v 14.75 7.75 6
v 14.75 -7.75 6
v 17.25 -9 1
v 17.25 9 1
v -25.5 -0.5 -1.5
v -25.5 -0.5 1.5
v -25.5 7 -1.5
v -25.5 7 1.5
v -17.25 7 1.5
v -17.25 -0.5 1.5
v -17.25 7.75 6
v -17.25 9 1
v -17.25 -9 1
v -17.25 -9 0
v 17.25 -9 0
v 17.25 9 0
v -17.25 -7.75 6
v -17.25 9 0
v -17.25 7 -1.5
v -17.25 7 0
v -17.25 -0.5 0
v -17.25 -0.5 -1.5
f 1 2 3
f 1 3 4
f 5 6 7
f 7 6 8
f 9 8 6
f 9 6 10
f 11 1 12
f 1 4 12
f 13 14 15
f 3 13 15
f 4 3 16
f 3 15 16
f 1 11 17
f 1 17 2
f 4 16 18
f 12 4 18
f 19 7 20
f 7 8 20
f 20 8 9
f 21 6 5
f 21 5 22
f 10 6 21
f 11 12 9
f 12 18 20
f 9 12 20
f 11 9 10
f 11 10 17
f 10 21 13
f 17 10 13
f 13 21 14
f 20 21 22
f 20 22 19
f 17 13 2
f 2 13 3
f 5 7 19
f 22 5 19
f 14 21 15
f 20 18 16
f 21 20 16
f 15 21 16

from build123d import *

# Parameters (mm, degrees)
F1_DEPTH = 6
F0_W     = 8.25
F0_H     = 7.5
F2_DEPTH = 1.5
F3_SIZE2 = 5
F3_SIZE  = 1.25
F4_SIZE2 = 2.5
F4_SIZE  = 5


with BuildPart() as f1:
    # F0 (on Top) → F1 (new body)
    with BuildSketch(Plane.XY):
        Polygon((17.25, 9), (-17.25, 9), (-17.25, 7), (-17.25, -0.5), (-17.25, -9), (17.25, -9), align=None)
    extrude(amount=F1_DEPTH)

    # F0 (on Top) → F2 (join, symmetric)
    with BuildSketch(Plane.XY):
        with Locations((-21.375, 3.25)):
            Rectangle(F0_W, F0_H)
    extrude(amount=F2_DEPTH, both=True)

    # F3
    f3_edges = [f1.edges().sort_by_distance(p)[0] for p in [
        (0, -9, 6),
        (0, 9, 6),
    ]]
    f3_side = f1.faces().sort_by_distance((0, 0, 6))[0]
    chamfer(f3_edges, length=F3_SIZE, length2=F3_SIZE2, reference=f3_side)

    # F4
    f4_edges = [f1.edges().sort_by_distance(p)[0] for p in [
        (17.25, 0, 6),
    ]]
    f4_side = f1.faces().sort_by_distance((17.25, 0, 2.9181))[0]
    chamfer(f4_edges, length=F4_SIZE, length2=F4_SIZE2, reference=f4_side)


solid = f1.part
